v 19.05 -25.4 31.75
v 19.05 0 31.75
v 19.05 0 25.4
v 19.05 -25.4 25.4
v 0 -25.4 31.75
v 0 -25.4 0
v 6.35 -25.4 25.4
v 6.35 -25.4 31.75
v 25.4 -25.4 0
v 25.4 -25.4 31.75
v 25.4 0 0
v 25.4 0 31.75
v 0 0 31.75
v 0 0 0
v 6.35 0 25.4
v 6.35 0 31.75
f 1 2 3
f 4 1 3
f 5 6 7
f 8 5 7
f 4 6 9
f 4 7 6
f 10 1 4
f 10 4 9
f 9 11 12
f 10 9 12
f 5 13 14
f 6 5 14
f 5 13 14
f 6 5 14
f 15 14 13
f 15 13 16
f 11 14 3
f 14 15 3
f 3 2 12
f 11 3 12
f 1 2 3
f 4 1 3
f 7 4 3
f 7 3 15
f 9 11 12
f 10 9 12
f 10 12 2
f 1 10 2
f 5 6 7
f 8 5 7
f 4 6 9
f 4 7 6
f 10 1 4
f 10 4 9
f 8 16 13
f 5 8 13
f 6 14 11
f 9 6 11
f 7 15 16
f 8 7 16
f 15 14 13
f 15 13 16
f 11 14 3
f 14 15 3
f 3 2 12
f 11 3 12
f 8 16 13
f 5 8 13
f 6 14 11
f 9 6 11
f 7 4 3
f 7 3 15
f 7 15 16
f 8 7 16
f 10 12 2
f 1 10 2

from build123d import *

# Parameters (mm, degrees)
F1_DEPTH = 25.4
F2_DEPTH = 25.4
F3_W     = 4.8232981935
F3_H     = 8.227978833
F4_DEPTH = 25.4


with BuildPart() as f1:
    # F0 (on Front) → F1 (new body)
    with BuildSketch(Plane.XZ):
        Polygon((0, 31.75), (0, 0), (25.4, 0), (25.4, 31.75), (19.05, 31.75), (19.05, 25.4), (6.35, 25.4), (6.35, 31.75), align=None)
    extrude(amount=F1_DEPTH)

    # F3 (on Front) → F4 (cut)
    with BuildSketch(Plane.XZ):
        with Locations((13.625479769, 4.1139894165)):
            Rectangle(F3_W, F3_H)
    extrude(amount=-F4_DEPTH, mode=Mode.SUBTRACT)


with BuildPart() as f2:
    # F0 (on Front) → F2 (new body)
    with BuildSketch(Plane.XZ):
        Polygon((0, 31.75), (0, 0), (25.4, 0), (25.4, 31.75), (19.05, 31.75), (19.05, 25.4), (6.35, 25.4), (6.35, 31.75), align=None)
    extrude(amount=F2_DEPTH)


solid = Compound([f1.part, f2.part])
